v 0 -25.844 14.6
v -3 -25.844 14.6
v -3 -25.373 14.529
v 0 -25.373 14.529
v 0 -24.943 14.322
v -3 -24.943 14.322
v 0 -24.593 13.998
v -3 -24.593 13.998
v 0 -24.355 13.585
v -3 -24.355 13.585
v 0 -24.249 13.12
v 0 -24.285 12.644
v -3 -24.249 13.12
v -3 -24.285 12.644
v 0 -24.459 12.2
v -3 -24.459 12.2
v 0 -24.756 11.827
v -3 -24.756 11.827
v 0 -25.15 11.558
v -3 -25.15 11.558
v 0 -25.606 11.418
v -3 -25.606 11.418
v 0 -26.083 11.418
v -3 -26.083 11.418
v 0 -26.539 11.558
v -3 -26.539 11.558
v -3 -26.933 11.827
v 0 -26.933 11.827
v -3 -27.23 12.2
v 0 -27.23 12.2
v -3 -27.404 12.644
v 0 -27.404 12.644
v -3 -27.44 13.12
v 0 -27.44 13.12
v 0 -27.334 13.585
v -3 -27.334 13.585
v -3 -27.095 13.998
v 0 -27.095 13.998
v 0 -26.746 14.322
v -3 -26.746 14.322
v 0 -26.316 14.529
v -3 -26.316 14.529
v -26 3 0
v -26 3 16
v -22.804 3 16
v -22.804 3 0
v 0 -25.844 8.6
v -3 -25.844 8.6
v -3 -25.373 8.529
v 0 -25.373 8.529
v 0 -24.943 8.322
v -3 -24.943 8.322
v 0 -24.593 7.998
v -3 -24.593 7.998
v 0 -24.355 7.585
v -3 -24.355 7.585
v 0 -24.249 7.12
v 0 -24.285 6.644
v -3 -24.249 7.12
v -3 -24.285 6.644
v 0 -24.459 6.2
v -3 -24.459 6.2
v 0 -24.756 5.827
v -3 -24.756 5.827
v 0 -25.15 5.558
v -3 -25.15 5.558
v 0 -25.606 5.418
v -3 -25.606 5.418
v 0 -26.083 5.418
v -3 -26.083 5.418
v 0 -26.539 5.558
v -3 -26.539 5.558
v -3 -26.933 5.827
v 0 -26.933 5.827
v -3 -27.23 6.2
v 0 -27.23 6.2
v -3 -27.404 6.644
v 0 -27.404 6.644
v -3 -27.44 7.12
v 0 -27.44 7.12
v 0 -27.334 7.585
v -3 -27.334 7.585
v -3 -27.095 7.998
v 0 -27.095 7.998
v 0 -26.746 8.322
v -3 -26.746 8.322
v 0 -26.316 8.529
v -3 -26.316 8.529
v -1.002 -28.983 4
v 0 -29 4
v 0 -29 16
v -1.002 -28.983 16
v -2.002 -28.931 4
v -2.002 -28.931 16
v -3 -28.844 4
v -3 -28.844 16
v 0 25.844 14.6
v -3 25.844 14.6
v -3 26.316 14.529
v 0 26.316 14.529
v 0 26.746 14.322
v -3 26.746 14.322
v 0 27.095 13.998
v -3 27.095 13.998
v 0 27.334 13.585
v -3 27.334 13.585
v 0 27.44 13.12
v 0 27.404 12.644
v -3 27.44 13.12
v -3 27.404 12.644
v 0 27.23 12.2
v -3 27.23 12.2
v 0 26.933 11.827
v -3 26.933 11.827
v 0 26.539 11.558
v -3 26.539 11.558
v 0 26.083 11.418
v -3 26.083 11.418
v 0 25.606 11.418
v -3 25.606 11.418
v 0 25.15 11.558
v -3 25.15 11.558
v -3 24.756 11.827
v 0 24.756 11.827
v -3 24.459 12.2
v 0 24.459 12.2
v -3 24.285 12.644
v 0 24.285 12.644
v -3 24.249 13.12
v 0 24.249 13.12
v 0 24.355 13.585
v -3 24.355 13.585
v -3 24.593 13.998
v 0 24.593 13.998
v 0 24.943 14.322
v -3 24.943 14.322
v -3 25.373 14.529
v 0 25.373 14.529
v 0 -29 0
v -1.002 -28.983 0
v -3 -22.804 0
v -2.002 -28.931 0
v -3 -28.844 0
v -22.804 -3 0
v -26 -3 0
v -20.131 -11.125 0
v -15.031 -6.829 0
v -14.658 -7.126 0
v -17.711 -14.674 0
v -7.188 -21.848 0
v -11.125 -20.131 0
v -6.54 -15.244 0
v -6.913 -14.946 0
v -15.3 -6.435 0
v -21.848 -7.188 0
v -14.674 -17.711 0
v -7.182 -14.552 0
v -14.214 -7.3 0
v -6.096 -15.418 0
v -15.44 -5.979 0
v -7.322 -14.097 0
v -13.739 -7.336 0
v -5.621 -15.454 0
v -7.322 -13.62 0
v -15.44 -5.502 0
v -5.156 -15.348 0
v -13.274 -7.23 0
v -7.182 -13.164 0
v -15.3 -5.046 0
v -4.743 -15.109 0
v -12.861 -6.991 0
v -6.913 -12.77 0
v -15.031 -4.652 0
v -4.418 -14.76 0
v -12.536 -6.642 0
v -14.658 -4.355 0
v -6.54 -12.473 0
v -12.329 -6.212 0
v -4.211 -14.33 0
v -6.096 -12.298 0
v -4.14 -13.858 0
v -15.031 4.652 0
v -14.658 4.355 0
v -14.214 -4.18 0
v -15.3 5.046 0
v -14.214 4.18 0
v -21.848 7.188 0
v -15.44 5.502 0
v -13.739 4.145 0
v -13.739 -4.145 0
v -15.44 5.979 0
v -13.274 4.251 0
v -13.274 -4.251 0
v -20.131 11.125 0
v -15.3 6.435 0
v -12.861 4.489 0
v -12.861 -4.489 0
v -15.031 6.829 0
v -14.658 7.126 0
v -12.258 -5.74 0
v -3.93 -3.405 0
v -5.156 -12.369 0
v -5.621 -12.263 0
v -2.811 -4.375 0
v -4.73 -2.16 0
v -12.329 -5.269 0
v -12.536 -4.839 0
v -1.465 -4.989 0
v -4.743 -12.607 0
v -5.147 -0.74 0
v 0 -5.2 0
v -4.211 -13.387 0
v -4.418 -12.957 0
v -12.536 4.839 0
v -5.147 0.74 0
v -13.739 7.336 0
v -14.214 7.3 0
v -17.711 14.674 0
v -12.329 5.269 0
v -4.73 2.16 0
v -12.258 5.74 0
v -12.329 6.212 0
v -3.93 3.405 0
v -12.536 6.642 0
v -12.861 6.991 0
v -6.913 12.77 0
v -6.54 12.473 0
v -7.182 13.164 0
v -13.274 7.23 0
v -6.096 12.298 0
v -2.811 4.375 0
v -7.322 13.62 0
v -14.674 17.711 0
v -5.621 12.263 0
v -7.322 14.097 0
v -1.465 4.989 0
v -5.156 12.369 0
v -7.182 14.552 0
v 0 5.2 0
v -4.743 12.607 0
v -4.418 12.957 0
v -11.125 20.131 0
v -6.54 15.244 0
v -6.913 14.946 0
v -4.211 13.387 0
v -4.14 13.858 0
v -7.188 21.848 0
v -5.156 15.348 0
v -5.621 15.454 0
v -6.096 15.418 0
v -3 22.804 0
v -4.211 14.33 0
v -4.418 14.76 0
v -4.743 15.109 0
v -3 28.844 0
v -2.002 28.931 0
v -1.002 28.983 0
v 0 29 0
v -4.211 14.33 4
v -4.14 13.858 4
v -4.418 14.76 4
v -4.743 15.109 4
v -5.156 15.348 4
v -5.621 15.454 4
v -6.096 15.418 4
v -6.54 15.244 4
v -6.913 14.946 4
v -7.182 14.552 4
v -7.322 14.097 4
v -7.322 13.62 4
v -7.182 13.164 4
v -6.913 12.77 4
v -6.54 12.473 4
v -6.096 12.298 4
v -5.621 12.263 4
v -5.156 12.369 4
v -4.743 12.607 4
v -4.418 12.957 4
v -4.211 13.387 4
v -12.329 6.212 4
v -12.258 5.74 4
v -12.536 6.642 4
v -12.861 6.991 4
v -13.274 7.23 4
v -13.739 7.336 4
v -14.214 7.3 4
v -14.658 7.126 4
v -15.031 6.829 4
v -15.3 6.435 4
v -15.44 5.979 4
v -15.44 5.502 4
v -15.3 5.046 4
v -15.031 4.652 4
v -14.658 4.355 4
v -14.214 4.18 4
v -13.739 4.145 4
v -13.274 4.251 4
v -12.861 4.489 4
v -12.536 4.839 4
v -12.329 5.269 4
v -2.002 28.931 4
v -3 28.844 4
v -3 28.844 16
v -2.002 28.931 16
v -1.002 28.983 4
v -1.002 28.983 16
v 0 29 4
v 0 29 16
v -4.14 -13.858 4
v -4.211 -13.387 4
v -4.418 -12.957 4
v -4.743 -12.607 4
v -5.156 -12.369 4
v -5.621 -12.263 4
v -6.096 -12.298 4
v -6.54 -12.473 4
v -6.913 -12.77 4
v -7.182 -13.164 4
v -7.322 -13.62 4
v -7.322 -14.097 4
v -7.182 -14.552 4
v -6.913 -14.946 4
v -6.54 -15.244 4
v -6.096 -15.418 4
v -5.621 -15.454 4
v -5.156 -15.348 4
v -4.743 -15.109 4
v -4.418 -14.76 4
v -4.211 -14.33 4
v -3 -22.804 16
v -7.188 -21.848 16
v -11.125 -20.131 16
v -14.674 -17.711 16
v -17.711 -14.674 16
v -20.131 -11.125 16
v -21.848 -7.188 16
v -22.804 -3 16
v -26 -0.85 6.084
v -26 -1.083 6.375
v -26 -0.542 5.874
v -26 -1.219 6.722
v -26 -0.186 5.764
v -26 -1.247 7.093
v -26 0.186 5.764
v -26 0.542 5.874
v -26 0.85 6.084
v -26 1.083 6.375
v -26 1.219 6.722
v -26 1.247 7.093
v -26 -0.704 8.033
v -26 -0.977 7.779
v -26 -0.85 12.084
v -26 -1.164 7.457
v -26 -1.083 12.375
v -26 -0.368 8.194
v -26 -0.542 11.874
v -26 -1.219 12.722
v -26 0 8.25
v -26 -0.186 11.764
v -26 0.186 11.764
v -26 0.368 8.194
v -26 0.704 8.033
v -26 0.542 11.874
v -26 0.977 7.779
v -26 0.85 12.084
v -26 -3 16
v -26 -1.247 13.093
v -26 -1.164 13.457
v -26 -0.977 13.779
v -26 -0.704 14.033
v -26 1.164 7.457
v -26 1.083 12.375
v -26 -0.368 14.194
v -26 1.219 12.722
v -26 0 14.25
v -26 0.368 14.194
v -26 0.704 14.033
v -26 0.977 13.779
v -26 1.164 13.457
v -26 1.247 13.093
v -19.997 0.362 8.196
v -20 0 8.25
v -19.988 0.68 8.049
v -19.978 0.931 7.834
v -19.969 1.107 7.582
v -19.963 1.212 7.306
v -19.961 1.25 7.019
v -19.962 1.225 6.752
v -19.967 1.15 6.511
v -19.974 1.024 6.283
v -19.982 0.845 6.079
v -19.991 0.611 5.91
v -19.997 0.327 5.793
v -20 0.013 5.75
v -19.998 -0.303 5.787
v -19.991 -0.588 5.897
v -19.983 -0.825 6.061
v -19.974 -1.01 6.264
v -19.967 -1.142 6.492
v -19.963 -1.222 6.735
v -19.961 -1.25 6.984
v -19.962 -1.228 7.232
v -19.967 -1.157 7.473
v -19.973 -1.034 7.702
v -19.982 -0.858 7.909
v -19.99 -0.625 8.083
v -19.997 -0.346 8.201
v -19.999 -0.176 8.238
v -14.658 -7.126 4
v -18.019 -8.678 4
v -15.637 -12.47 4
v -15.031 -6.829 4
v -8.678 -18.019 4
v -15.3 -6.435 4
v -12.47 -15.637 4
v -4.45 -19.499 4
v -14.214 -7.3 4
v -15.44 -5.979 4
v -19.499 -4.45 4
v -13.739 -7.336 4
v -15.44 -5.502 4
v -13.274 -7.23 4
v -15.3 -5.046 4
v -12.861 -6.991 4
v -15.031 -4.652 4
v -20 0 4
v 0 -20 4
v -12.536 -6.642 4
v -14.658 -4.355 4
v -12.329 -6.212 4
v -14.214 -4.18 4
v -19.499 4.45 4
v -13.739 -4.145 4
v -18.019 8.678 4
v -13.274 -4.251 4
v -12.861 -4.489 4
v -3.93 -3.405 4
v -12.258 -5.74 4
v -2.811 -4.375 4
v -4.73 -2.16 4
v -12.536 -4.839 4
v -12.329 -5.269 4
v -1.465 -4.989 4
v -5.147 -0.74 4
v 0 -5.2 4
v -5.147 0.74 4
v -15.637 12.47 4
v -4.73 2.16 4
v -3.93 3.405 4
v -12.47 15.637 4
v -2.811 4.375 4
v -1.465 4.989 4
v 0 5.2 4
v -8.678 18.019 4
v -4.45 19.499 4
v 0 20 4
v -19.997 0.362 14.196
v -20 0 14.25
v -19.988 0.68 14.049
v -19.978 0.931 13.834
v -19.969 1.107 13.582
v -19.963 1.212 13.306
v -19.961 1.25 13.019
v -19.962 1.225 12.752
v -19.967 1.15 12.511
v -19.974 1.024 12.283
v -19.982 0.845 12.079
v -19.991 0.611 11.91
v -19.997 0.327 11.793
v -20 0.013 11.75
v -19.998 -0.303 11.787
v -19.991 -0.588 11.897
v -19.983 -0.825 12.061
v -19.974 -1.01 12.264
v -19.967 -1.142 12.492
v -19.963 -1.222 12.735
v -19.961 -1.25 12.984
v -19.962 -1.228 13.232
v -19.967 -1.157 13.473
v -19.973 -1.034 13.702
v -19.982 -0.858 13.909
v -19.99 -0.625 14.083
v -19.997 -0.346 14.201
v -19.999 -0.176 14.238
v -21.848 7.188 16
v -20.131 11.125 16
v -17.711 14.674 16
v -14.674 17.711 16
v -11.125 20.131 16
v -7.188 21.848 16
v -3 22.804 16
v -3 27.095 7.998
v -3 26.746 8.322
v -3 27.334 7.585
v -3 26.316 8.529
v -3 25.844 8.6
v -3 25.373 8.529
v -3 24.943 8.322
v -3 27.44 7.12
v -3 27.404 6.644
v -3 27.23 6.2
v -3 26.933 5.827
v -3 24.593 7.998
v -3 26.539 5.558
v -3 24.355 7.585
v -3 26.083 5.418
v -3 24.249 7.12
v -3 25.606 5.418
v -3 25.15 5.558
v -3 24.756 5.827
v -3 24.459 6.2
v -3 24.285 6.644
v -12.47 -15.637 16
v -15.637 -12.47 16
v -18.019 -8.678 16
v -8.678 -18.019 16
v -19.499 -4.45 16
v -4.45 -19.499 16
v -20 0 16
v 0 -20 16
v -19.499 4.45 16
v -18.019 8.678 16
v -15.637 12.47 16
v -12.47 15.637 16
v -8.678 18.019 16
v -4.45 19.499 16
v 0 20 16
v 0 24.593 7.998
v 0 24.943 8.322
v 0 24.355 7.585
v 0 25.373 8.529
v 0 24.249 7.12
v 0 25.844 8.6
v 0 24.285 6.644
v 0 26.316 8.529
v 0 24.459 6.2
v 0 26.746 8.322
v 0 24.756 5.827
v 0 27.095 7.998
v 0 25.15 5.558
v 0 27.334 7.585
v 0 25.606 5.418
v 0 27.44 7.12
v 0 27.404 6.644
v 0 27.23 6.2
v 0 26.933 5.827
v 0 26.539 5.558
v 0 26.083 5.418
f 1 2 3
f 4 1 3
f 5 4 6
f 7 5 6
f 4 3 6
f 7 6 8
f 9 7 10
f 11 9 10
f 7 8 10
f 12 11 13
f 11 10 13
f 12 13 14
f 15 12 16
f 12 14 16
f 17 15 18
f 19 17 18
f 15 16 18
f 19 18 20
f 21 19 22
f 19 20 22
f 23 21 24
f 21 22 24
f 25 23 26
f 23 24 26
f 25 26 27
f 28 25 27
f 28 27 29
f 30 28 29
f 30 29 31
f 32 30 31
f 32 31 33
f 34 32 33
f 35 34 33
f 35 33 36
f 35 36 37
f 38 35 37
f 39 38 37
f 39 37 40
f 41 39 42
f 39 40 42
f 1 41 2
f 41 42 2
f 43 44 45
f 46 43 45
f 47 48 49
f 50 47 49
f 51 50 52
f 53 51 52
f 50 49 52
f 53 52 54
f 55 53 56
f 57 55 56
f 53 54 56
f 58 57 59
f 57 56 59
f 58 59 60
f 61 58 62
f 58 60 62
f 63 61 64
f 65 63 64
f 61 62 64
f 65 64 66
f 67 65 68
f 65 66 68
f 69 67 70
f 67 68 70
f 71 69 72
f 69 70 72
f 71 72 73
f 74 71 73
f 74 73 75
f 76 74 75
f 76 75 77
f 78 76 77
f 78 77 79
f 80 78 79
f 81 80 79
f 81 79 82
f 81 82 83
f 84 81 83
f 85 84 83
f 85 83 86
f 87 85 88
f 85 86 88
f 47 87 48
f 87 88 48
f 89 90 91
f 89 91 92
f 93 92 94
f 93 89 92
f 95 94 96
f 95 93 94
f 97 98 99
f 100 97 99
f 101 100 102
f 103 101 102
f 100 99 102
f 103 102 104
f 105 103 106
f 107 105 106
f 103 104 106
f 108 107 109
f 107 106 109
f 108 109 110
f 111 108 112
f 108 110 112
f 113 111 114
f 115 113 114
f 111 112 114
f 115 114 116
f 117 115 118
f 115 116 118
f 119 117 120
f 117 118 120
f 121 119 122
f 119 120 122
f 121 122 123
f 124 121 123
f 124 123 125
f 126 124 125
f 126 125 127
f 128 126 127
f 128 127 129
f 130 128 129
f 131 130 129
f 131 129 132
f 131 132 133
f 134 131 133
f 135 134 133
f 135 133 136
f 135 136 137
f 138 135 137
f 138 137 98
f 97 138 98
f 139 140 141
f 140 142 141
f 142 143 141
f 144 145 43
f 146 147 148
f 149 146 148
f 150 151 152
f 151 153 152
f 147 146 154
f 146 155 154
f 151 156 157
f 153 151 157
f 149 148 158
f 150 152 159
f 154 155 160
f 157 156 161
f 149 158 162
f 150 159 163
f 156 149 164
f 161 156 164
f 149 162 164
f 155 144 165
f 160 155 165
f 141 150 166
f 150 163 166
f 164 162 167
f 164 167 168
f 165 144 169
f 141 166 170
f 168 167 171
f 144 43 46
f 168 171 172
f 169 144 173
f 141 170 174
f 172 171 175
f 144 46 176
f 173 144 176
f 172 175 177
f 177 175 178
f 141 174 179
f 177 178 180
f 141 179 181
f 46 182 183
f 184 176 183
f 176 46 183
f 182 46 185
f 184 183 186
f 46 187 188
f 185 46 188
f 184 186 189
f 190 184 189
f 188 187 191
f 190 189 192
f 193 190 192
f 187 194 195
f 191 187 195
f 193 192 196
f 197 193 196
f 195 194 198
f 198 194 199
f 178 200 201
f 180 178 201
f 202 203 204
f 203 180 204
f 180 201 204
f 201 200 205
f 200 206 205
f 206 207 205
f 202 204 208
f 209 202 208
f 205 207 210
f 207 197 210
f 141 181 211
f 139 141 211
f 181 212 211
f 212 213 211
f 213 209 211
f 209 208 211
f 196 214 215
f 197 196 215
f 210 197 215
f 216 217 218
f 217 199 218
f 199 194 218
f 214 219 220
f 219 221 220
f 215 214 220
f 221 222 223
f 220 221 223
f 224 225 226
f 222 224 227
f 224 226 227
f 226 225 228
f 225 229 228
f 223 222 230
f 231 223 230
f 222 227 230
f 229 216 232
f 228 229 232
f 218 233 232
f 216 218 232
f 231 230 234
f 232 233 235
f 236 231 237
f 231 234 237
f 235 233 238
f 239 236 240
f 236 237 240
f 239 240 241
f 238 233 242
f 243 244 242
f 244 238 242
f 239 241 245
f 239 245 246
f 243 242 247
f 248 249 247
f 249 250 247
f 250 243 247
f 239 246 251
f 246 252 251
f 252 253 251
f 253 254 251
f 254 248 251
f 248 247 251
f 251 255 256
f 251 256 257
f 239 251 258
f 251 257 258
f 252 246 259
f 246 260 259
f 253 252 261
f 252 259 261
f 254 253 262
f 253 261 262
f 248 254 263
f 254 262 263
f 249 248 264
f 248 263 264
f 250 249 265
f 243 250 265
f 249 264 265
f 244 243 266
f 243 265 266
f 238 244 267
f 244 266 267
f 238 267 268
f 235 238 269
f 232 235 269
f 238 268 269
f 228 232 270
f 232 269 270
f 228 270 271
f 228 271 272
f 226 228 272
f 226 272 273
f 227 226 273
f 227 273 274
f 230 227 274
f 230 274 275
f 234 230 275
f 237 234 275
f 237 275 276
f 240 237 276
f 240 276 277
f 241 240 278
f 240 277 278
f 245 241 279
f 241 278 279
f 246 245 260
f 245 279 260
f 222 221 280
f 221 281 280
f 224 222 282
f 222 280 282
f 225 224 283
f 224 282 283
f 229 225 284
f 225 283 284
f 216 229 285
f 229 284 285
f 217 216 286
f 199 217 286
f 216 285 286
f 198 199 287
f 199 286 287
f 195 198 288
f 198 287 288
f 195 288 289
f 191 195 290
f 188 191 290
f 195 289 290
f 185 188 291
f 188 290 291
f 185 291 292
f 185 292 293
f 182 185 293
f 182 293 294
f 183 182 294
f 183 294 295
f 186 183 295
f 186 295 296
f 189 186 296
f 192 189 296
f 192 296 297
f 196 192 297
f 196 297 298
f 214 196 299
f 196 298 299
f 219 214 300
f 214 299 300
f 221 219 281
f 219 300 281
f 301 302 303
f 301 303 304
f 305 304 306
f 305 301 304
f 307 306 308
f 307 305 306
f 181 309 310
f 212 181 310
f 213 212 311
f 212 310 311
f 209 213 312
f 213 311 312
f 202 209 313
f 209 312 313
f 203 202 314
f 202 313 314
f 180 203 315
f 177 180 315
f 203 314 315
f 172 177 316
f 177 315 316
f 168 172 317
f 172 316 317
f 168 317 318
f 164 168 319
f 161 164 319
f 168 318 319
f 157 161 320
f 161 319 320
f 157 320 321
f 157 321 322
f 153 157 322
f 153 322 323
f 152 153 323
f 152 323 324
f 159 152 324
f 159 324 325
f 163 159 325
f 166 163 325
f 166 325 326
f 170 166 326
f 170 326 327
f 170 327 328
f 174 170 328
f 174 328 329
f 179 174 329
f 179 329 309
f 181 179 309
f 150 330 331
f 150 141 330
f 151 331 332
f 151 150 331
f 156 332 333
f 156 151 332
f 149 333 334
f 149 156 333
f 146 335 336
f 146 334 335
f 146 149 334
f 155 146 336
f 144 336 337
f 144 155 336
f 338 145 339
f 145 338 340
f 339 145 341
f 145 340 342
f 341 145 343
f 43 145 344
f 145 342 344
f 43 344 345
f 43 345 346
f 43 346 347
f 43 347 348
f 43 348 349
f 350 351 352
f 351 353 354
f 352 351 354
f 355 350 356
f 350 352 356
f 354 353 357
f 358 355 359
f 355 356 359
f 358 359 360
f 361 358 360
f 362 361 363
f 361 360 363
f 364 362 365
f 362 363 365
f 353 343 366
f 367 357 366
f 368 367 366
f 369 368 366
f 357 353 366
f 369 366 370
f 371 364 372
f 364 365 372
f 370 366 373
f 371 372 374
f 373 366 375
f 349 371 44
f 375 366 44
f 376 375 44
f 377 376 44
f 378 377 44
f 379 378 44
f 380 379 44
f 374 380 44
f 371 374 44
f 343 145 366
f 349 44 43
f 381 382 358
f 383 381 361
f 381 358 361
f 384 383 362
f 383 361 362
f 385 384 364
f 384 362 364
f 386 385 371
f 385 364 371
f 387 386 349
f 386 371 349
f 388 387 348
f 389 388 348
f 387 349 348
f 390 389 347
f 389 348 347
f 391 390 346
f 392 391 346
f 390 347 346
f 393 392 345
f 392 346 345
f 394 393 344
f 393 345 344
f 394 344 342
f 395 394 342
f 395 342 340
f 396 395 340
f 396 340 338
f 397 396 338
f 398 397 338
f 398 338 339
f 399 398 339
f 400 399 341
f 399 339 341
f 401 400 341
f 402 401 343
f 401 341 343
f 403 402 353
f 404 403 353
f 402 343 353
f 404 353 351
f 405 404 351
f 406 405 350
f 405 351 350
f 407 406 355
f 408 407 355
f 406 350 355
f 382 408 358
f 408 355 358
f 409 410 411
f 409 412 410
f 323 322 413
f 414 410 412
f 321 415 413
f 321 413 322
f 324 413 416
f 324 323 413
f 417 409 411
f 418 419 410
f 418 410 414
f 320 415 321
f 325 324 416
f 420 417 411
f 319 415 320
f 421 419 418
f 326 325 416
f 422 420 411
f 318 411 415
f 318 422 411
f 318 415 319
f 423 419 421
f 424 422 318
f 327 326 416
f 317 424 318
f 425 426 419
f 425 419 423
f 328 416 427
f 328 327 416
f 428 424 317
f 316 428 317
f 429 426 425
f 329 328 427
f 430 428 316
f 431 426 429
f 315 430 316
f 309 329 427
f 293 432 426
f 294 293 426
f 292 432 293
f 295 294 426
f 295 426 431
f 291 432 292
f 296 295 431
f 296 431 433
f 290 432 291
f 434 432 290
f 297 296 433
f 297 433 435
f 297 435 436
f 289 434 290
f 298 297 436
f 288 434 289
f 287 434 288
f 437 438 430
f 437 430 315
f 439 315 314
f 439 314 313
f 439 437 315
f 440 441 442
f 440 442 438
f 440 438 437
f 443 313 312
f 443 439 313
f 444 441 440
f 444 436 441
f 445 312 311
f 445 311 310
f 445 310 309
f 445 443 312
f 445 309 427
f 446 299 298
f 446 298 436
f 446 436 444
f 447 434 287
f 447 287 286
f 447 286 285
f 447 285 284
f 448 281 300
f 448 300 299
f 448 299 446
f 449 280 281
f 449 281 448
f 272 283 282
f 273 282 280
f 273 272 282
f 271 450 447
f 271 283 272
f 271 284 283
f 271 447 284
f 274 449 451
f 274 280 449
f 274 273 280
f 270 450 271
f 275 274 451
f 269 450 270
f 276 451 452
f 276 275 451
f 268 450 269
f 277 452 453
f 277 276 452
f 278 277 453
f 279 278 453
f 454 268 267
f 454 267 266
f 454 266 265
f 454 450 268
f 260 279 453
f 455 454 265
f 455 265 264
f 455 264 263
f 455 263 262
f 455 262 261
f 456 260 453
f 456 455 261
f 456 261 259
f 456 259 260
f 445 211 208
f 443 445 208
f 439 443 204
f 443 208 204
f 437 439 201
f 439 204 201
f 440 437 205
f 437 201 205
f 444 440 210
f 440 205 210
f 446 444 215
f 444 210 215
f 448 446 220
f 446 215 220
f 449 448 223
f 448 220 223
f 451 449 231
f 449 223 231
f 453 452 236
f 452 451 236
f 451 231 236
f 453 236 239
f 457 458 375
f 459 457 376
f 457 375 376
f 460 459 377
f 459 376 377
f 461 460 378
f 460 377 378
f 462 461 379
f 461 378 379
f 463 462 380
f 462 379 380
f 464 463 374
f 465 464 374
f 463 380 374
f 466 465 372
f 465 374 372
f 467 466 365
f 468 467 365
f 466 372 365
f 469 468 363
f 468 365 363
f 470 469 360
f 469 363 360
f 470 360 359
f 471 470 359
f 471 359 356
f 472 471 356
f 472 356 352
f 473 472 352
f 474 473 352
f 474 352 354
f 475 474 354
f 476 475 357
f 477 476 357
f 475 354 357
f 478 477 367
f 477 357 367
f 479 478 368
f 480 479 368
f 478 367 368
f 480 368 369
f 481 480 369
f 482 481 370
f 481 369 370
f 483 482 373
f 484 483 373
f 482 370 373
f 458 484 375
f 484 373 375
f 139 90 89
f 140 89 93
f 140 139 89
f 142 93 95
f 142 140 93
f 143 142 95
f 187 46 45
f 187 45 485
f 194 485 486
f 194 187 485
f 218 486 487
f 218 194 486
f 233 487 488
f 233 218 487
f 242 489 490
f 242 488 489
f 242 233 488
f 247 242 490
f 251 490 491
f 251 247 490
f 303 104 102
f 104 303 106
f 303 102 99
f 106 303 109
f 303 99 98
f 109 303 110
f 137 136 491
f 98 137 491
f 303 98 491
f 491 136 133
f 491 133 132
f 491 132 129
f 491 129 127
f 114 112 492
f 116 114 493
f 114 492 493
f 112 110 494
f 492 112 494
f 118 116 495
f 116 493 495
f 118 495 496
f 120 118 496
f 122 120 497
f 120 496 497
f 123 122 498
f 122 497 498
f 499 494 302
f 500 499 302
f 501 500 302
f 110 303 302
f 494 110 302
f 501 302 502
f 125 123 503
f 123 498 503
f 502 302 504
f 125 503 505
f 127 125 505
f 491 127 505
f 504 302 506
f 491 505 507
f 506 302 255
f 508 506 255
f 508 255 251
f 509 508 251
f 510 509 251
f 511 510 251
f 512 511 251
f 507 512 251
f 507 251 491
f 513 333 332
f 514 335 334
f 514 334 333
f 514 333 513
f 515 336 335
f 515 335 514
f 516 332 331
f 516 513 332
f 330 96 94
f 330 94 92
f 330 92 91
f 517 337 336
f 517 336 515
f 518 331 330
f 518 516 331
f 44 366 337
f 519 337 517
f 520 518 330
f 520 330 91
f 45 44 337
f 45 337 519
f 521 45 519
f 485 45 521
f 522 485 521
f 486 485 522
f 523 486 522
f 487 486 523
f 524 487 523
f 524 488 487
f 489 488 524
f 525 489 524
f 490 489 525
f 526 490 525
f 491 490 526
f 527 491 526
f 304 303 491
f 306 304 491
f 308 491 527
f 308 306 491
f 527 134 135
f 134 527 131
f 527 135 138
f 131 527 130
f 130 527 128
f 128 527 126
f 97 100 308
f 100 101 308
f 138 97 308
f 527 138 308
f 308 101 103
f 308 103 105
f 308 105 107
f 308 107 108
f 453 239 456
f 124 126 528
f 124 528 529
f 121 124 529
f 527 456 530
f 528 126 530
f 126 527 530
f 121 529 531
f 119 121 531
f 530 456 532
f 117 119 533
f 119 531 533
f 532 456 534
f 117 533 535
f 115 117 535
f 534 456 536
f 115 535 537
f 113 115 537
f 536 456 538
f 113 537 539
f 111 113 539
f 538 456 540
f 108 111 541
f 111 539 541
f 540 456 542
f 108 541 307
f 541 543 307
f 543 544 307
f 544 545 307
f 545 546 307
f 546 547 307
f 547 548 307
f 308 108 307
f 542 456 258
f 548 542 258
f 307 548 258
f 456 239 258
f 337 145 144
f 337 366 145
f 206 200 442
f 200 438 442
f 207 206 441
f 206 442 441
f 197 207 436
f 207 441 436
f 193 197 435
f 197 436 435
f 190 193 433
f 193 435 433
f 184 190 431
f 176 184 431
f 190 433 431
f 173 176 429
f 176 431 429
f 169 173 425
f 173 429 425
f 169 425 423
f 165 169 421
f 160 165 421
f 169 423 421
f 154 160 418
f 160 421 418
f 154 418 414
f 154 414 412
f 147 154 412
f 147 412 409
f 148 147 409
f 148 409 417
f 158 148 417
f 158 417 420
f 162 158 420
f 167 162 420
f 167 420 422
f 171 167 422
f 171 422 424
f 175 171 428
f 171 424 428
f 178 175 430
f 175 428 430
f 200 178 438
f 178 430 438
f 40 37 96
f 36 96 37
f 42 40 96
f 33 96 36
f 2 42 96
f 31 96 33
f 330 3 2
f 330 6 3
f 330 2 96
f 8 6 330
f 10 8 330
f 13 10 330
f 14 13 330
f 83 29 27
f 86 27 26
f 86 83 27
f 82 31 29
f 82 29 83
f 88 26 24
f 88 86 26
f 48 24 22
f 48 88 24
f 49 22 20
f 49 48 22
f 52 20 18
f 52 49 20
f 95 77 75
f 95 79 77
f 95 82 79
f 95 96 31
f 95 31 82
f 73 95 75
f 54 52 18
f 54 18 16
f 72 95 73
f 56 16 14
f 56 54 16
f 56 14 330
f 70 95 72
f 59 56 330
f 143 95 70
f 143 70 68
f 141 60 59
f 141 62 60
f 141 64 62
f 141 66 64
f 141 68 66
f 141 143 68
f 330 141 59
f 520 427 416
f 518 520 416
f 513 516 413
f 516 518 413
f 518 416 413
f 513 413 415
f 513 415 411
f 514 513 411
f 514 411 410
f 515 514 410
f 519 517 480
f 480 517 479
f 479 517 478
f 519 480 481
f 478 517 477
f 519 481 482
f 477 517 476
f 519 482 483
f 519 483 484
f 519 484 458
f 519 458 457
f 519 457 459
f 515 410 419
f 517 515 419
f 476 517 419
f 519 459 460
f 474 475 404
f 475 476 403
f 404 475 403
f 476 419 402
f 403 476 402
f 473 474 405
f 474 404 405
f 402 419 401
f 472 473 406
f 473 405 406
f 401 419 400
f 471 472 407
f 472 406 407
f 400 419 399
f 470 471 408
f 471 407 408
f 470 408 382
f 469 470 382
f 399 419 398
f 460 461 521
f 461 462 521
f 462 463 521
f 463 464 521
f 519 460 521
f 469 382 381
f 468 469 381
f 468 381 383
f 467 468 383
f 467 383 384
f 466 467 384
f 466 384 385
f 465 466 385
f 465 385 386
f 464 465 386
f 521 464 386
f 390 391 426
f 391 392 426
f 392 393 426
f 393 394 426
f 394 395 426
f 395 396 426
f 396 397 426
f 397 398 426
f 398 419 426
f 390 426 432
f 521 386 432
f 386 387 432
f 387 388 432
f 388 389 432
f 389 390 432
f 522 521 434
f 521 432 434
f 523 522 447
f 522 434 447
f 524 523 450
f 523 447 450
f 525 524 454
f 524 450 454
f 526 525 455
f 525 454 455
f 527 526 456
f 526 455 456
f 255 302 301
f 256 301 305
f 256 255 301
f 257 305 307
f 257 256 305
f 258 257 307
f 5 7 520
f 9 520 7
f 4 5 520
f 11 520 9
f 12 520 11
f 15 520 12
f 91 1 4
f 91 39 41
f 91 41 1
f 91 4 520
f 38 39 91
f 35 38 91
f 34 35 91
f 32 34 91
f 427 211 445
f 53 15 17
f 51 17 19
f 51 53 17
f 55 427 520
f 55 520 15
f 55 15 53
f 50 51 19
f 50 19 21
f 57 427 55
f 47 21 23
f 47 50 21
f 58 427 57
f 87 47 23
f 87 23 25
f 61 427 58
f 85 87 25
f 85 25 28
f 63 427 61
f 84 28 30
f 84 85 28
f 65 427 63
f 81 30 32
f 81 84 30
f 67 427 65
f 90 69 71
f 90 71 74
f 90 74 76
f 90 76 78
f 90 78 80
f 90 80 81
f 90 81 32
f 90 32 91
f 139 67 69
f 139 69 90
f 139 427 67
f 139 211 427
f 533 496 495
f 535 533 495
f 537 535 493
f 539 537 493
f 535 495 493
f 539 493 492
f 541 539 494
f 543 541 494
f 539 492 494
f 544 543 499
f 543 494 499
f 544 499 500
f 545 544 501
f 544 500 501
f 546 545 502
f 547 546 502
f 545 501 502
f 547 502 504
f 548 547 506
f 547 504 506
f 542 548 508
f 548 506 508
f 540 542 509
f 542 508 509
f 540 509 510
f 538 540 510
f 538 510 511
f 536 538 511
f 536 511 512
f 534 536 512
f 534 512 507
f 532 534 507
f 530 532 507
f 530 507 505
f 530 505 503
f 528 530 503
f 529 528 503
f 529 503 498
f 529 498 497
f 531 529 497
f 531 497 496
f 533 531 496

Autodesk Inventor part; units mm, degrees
ref_plane "YZ Plane" through (0, 0, 0) normal (1, 0, 0) x (0, 1, 0)
ref_plane "XZ Plane" through (0, 0, 0) normal (0, 1, 0) x (-1, 0, 0)
ref_plane "XY Plane" through (0, 0, 0) normal (0, 0, 1) x (1, 0, 0)
sketch "스케치1" plane through (0, 0, 0) normal (0, 0, 1) x (1, 0, 0)
  arc A0 (0, 5.2) -> (0, -5.2) centre (0, 0) ccw
  arc A1 (0, 23) -> (0, -23) centre (0, 0) ccw
  line L0 (0, 0) -> (0, 23)
  line L1 (0, 0) -> (0, -23)
  dimension "d0" = 10.4
  dimension "d1" = 46
extrude "돌출1" add sketch "스케치1" along normal blind 4 contours A0 L1 A1 L0
sketch "스케치2" plane through (0, 0, 4) normal (0, 0, 1) x (1, 0, 0)
  arc A0 (0, 20) -> (0, -20) centre (0, 0) ccw
  arc A1 (0, 23) -> (0, -23) centre (0, 0) ccw
  line L0 (0, 20) -> (0, 29)
  line L1 (0, 0) -> (0, -29)
  arc A2 (-3, -28.8444) -> (0, -29) centre (0, 0) ccw
  arc A3 (0, 29) -> (-3, 28.8444) centre (0, 0) ccw
  line L2 (-3, 28.8444) -> (-3, 19.7737)
  line L3 (-3, -19.7737) -> (-3, -22.8035)
  line L4 (-3, -28.8444) -> (-3, -19.7737)
  line L5 (-3, 19.7737) -> (-3, 28.8444)
  line L6 (-3, 22.8035) -> (-3, 19.7737)
  line L7 (-3, -19.7737) -> (-3, -28.8444)
  line L8 (0, -29) -> (0, -20)
  line L9 (0, 20) -> (0, 29)
  line L10 (0, 29) -> (0, 20)
  line L11 (0, -20) -> (0, -29)
  dimension "d4" = 40
  dimension "d5" = 46
  dimension "d6" = 29
  dimension "d7" = 29
extrude "돌출2" add sketch "스케치2" along normal blind 12
sketch "스케치3" plane through (-3, -28.8444, 4) normal (-1, 0, 0) x (0, 0, 1)
  line L0 (0, 51.6479) -> (12, 51.6479) projected
  line L1 (12, 57.6888) -> (12, 51.6479) projected
  line L2 (0, 57.6888) -> (12, 57.6888) projected
  line L3 (0, 57.6888) -> (0, 51.6479) projected
  line L4 (12, 6.0409) -> (0, 6.0409) projected
  line L5 (0, 6.0409) -> (0, 0) projected
  line L6 (0, 0) -> (12, 0) projected
  line L7 (12, 6.0409) -> (12, 0) projected
  circle A0 centre (9, 3) radius 1.6
  circle A1 centre (3, 3) radius 1.6
  circle A2 centre (9, 54.6888) radius 1.6
  circle A3 centre (3, 54.6888) radius 1.6
  point P0 (-4, 28.8444)
  dimension "d16" = 3.2
  dimension "d17" = 3.2
  dimension "d18" = 3.2
  dimension "d19" = 3.2
  dimension "d20" = 3
  dimension "d21" = 3
  dimension "d22" = 3
  dimension "d23" = 3
  dimension "d24" = 3
  dimension "d25" = 3
  dimension "d26" = 3
  dimension "d27" = 3
extrude "돌출3" cut sketch "스케치3" against normal up to surface (3 mm away) contours A0 | A1 | A2 | A3
sketch "스케치4" plane through (0, 0, 4) normal (0, 0, 1) x (1, 0, 0)
  circle A0 centre (-5.7403, 13.8582) radius 1.25
  circle A1 centre (-5.7403, -13.8582) radius 1.25
  circle A2 centre (-13.8582, -5.7403) radius 1.25
  circle A3 centre (-13.8582, 5.7403) radius 1.25
  line L0 (-0.7301, 13.7687) -> (-0.7301, 13.7687)
  circle A4 centre (-5.7403, 13.8582) radius 1.6
  circle A5 centre (-13.8582, 5.7403) radius 1.6
  circle A6 centre (-13.8582, -5.7403) radius 1.6
  circle A7 centre (-5.7403, -13.8582) radius 1.6
  arc A8 (0, 20) -> (0, -20) centre (0, 0) ccw projected
  line L1 (0, -20) -> (0, -5.2) projected
  arc A9 (0, 5.2) -> (0, -5.2) centre (0, 0) ccw projected
  line L2 (0, 5.2) -> (0, 20) projected
  line L3 (0, 0) -> (-5.7403, 13.8582)
  line L4 (0, 0) -> (15, 0) construction
  line L5 (0, 0) -> (-13.8582, 5.7403)
  line L6 (0, 0) -> (15, 0) construction
  line L7 (0, 0) -> (-13.8582, 5.7403)
  line L8 (0, 0) -> (15, 0) construction
  line L9 (0, 0) -> (-13.8582, -5.7403)
  line L10 (0, 0) -> (15, 0) construction
  line L11 (0, 0) -> (-5.7403, -13.8582)
  line L12 (0, 0) -> (15, 0) construction
  dimension "d30" = 3.2
  dimension "d31" = 3.2
  dimension "d32" = 3.2
  dimension "d33" = 3.2
  dimension "d56" = 15
  dimension "d57" = 112.5
  dimension "d58" = 15
  dimension "d59" = 157.5
  dimension "d61" = 15
  dimension "d62" = 202.5
  dimension "d63" = 15
  dimension "d64" = 157.5
  dimension "d65" = 15
  dimension "d66" = 112.5
extrude "돌출4" cut sketch "스케치4" against normal up to surface (4 mm away) contours A0 | A4 | A1 | A7 | A2 | A6 | A3 | A5
sketch "스케치5" plane through (0, 0, 16) normal (0, 0, 1) x (1, 0, 0)
  circle A0 centre (0, 0) radius 23
  arc A1 (-3, 22.8035) -> (-3, -22.8035) centre (0, 0) ccw projected
  line L0 (-23, 0) -> (-26, 0)
  line L1 (-23, 0) -> (-20, 0) construction
  line L2 (-26, 0) -> (-26, -3)
  line L3 (-26, -3) -> (-22.8035, -3)
  line L4 (-26, 0) -> (-26, 3)
  line L5 (-26, 0) -> (-23, 0) construction
  line L6 (-26, 3) -> (-22.8035, 3)
  dimension "d36" = 46
  dimension "d37" = 3
  dimension "d38" = 180
  dimension "d39" = 3
  dimension "d40" = 90
  dimension "d41" = 90
  dimension "d42" = 3
  dimension "d43" = 90
extrude "돌출5" add sketch "스케치5" against normal blind 16 contours A0 L0 L4 L6 | L3 L2 L0 A0
sketch "스케치6" plane through (-26, -3, 16) normal (-1, 0, 0) x (0, 0, 1)
  line L0 (0, 6) -> (0, 0) projected
  line L1 (0, 6) -> (-16, 6) projected
  line L2 (-16, 0) -> (-16, 6) projected
  line L3 (0, 0) -> (-16, 0) projected
  circle A0 centre (-3, 3) radius 1.25
  circle A1 centre (-9, 3) radius 1.25
  point P0 (-16, 3)
  dimension "d46" = 2.5
  dimension "d47" = 2.5
  dimension "d48" = 3
  dimension "d49" = 7
  dimension "d50" = 3
  dimension "d51" = 3
extrude "돌출6" cut sketch "스케치6" against normal blind 8 contours A0 | A1
sketch "스케치7" plane through (0, 0, 0) normal (0, 0, -1) x (-1, 0, 0)
  arc A0 (0, -23) -> (3, -22.8035) centre (0, 0) ccw projected
  line L0 (0, -29) -> (0, -23) projected
  arc A1 (0, -29) -> (3, -28.8444) centre (0, 0) ccw projected
  line L1 (3, -22.8035) -> (3, -28.8444) projected
  arc A2 (3, 22.8035) -> (0, 23) centre (0, 0) ccw projected
  line L2 (3, 28.8444) -> (3, 22.8035) projected
  arc A3 (3, 28.8444) -> (0, 29) centre (0, 0) ccw projected
  line L3 (0, 23) -> (0, 29) projected
extrude "돌출7" add sketch "스케치7" against normal blind 4
properties part number "조인트3링크2고정부" material "알루미늄 6061"
